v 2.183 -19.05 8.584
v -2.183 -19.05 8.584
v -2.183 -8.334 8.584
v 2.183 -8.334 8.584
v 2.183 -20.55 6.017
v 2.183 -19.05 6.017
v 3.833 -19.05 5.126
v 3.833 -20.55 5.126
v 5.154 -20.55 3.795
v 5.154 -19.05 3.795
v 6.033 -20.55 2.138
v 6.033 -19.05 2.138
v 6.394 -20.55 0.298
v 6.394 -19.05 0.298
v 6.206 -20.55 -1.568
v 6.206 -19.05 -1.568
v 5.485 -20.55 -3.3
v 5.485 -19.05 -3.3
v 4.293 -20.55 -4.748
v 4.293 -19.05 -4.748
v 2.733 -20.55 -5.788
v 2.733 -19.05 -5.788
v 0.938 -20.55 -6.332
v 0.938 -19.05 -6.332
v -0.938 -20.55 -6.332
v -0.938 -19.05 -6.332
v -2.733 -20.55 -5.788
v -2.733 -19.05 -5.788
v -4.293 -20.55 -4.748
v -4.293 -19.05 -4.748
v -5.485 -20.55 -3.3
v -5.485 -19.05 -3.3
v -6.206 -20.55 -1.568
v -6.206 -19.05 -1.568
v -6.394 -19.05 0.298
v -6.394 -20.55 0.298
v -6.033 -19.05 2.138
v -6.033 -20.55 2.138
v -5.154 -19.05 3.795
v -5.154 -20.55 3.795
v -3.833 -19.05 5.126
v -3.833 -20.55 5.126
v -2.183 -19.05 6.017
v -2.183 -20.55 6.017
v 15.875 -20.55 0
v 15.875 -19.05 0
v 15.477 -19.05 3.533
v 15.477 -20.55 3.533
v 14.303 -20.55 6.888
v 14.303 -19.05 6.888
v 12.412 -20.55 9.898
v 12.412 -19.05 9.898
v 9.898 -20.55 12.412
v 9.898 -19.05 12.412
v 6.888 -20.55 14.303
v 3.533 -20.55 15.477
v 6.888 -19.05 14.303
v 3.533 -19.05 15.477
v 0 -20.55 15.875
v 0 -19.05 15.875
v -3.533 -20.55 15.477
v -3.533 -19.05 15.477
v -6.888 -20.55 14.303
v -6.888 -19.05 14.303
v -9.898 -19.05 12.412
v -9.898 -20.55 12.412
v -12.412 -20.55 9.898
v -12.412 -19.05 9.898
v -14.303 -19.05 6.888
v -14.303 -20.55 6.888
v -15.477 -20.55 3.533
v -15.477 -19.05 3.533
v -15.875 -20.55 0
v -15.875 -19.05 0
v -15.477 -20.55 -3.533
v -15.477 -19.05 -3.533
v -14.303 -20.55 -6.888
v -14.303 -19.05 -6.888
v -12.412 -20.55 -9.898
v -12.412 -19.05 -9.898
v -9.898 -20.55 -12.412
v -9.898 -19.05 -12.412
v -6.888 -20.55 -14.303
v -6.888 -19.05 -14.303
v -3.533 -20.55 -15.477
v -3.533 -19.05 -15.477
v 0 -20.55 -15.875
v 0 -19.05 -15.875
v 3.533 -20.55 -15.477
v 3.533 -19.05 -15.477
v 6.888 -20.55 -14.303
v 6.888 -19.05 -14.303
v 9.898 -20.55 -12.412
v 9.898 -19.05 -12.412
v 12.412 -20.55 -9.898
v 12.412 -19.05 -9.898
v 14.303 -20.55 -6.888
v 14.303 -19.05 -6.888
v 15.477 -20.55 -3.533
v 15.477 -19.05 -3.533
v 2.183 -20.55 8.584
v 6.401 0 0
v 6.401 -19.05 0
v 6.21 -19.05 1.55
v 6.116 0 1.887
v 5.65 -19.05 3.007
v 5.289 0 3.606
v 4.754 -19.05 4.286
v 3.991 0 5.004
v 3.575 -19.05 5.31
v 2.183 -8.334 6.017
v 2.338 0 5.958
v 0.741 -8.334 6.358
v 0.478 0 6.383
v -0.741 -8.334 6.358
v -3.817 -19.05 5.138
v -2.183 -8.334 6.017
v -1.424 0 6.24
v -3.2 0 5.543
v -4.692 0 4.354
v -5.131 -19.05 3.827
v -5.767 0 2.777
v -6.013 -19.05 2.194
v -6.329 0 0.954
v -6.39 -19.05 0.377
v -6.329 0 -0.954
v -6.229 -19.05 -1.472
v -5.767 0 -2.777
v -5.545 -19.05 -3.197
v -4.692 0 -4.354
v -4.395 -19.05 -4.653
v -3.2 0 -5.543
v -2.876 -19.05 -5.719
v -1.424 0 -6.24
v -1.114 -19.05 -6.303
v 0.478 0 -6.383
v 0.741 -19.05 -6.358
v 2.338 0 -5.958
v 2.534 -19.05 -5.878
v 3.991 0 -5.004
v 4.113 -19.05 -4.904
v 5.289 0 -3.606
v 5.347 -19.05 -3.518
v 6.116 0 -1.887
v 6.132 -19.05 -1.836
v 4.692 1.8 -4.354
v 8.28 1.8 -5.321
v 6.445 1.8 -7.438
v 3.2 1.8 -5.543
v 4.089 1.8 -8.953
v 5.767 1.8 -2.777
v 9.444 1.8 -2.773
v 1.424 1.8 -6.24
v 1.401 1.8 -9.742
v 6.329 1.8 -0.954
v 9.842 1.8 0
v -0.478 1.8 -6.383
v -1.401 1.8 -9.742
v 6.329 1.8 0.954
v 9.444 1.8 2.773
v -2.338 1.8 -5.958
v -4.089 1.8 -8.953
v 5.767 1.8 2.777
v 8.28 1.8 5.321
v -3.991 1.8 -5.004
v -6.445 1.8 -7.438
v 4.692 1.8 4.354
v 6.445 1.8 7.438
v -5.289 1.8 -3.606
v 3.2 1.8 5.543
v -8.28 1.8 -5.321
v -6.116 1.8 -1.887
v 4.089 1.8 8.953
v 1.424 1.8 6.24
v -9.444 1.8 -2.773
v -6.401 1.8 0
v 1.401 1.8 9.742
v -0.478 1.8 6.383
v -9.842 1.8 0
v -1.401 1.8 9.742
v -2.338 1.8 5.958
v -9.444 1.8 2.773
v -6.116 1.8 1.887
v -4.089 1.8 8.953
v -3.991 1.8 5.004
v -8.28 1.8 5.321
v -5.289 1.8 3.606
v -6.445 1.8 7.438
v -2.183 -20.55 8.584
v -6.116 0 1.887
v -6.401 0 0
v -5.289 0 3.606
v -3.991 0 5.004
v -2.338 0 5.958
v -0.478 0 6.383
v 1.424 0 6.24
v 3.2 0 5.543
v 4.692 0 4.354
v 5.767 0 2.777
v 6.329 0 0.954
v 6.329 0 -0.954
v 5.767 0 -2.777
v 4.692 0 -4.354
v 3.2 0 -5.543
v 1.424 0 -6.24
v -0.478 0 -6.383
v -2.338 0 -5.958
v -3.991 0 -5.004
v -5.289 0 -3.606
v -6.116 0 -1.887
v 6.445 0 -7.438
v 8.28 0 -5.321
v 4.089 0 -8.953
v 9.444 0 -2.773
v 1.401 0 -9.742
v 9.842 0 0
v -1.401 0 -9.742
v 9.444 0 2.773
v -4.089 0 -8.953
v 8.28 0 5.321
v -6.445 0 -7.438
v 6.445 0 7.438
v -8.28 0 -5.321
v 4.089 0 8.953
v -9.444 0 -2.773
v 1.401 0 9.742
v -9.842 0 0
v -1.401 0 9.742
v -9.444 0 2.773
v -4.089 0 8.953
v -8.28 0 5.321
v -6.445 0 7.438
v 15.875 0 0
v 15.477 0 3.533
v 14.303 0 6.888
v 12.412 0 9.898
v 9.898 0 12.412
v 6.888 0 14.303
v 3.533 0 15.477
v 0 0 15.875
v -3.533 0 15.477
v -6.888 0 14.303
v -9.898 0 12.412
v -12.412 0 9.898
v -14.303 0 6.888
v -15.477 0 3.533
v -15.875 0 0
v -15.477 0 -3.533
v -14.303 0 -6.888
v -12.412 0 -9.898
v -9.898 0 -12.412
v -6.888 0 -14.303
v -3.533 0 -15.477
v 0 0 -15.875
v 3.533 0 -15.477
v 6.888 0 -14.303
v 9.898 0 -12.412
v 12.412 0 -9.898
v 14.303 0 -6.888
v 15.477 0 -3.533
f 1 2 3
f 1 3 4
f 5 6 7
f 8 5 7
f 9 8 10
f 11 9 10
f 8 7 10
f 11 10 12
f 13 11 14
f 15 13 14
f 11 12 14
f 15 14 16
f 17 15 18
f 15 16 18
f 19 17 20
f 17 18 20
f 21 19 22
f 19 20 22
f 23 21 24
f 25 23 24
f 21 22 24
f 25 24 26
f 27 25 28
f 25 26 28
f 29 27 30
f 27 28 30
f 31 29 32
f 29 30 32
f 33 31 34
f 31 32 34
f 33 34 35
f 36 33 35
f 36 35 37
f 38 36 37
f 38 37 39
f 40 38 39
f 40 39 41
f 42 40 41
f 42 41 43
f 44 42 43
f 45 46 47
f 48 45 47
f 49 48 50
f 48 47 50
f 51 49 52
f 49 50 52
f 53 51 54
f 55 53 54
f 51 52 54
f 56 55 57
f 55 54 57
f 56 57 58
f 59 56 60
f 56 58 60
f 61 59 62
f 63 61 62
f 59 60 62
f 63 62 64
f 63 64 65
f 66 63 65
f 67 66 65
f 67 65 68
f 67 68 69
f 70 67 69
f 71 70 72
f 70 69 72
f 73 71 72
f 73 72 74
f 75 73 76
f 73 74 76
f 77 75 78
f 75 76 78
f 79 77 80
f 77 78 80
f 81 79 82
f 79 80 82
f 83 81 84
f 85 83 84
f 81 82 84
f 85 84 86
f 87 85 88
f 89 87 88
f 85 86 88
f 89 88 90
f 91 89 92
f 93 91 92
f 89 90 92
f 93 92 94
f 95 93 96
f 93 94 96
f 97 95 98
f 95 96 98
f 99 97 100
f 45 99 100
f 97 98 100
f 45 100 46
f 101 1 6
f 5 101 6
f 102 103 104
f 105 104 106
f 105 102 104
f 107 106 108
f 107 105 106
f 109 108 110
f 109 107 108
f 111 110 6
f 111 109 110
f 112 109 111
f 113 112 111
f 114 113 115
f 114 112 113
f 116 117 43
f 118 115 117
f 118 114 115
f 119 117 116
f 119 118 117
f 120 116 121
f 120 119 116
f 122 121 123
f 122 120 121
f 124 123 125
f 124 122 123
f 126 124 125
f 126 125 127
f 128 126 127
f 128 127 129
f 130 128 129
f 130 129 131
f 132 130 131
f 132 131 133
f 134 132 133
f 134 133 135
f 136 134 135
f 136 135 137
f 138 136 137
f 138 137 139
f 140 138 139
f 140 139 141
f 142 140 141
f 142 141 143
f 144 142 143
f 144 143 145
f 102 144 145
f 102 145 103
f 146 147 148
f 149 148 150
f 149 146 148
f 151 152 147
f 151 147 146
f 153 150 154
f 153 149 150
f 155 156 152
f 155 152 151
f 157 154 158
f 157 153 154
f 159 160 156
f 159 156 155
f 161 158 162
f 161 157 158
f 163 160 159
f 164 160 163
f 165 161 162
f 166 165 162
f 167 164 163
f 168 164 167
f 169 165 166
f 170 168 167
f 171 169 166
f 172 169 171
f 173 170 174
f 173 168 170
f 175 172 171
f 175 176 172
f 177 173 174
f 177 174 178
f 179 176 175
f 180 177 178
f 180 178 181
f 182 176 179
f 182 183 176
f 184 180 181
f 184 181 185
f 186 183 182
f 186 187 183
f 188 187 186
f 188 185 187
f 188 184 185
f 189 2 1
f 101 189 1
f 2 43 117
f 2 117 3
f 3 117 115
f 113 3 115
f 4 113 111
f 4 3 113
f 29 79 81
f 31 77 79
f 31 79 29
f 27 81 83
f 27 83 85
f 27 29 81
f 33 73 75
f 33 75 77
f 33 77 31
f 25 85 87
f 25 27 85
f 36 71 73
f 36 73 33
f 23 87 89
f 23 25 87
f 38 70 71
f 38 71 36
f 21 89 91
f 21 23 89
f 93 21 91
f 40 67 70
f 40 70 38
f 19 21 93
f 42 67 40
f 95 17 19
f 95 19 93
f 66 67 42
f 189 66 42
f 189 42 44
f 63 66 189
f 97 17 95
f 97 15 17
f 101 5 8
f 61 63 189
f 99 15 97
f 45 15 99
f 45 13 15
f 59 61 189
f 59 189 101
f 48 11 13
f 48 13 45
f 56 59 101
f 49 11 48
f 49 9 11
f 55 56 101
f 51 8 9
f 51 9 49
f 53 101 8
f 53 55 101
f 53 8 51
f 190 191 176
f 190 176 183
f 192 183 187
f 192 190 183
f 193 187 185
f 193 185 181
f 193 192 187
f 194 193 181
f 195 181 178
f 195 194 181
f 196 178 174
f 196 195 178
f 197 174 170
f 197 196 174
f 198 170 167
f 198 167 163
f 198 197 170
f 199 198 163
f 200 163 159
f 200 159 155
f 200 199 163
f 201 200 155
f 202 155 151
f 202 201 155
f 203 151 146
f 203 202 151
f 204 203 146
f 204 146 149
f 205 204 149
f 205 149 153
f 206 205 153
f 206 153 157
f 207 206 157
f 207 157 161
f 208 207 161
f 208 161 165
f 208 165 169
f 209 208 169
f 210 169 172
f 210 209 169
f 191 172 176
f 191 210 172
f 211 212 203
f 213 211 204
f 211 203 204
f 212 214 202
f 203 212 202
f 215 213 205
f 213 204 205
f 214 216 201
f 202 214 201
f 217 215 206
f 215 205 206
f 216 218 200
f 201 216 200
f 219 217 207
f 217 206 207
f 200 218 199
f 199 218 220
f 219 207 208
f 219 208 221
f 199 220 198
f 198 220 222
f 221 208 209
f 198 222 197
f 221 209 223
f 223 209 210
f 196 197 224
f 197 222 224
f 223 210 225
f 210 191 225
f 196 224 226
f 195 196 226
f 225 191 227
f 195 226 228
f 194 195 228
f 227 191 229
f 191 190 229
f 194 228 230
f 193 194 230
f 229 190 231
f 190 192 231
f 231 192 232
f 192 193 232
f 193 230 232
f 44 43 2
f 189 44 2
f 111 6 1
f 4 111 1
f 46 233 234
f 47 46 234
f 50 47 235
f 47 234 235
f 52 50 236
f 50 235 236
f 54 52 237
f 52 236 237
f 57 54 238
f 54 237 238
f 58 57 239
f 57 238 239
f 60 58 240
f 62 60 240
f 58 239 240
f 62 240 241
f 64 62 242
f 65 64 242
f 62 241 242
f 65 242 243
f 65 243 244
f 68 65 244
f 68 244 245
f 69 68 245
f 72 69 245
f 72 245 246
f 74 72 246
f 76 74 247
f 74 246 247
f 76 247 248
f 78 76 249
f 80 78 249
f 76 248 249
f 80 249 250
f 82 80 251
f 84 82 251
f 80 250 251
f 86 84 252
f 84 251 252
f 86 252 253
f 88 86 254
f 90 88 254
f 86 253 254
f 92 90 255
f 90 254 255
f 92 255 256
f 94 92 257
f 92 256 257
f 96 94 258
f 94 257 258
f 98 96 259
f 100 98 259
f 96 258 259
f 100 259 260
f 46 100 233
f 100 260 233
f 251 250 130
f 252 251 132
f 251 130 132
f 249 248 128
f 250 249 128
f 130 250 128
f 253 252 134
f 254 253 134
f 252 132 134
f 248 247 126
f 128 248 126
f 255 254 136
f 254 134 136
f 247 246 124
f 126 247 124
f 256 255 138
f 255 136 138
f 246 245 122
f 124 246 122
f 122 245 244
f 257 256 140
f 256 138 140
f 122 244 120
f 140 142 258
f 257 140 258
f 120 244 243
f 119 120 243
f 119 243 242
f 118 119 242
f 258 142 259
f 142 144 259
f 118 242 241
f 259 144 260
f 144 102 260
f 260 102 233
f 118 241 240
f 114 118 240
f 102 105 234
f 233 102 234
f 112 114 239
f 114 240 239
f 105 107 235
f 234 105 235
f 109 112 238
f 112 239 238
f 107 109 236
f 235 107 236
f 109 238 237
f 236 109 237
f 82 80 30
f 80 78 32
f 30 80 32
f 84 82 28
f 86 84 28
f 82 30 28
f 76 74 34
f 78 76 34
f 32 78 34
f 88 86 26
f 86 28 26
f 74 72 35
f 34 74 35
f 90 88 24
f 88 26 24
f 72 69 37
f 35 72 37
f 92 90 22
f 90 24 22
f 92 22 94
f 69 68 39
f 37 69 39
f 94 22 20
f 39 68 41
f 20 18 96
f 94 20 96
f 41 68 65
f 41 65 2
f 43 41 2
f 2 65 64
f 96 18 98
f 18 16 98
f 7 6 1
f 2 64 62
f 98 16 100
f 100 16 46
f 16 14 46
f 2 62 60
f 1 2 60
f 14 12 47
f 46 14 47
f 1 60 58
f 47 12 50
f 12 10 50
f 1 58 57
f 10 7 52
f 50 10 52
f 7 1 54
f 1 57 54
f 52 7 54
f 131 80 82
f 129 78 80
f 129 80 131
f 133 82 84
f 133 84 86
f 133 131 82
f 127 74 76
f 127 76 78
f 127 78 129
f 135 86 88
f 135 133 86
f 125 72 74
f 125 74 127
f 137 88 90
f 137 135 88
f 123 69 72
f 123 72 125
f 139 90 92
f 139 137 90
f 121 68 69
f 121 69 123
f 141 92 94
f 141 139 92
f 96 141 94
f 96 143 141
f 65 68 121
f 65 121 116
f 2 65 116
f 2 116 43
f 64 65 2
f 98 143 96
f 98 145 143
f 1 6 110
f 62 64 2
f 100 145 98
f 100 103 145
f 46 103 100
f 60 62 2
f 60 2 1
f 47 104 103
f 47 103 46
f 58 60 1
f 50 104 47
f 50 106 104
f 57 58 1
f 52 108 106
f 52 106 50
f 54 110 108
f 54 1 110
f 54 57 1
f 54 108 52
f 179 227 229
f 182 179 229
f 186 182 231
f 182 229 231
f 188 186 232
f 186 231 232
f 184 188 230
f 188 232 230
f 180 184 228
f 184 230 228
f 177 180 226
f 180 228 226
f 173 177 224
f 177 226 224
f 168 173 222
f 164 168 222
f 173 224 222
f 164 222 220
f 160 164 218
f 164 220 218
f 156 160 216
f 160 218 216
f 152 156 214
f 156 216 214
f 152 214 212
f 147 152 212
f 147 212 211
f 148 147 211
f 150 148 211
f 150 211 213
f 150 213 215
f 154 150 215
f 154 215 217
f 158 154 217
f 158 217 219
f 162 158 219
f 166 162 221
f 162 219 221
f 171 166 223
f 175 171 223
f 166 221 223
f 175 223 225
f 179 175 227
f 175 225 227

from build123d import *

# Parameters (mm, degrees)
F0_R     = 15.875
F0_R_2   = 6.4008
F1_DEPTH = 19.05
F2_W     = 4.365626
F2_H     = 4.365625
F3_DEPTH = 10.715625
F4_R     = 15.875
F5_DEPTH = 1.5
F6_R     = 9.8425
F6_R_2   = 6.4008
F7_DEPTH = 1.8


with BuildPart() as f1:
    # F0 (on Front) → F1 (new body)
    with BuildSketch(Plane.XZ):
        Circle(F0_R)
        Circle(F0_R_2, mode=Mode.SUBTRACT)
    extrude(amount=F1_DEPTH)

    # F2 (on face) → F3 (cut)
    with BuildSketch(Plane.XZ.offset(19.05)):
        with Locations((0, 6.4008)):
            Rectangle(F2_W, F2_H)
    extrude(amount=-F3_DEPTH, mode=Mode.SUBTRACT)


with BuildPart() as f5:
    # F4 (on face) → F5 (new body)
    with BuildSketch(Plane.XZ.offset(19.05)):
        Circle(F4_R)
        with BuildLine():
            ThreePointArc((2.182813, 6.017106), (0, -6.4008), (-2.182813, 6.017106))
            Line((-2.182813, 6.017106), (-2.182813, 8.583613))
            Line((-2.182813, 8.583613), (2.182813, 8.583613))
            Line((2.182813, 8.583613), (2.182813, 6.017106))
        make_face(mode=Mode.SUBTRACT)
    extrude(amount=F5_DEPTH)


with BuildPart() as f7:
    # F6 (on face) → F7 (new body)
    with BuildSketch(Plane(origin=(0, 0, 0), x_dir=(-1, 0, 0), z_dir=(0, 1, 0))):
        Circle(F6_R)
        Circle(F6_R_2, mode=Mode.SUBTRACT)
    extrude(amount=F7_DEPTH)


solid = Compound([f1.part, f5.part, f7.part])
